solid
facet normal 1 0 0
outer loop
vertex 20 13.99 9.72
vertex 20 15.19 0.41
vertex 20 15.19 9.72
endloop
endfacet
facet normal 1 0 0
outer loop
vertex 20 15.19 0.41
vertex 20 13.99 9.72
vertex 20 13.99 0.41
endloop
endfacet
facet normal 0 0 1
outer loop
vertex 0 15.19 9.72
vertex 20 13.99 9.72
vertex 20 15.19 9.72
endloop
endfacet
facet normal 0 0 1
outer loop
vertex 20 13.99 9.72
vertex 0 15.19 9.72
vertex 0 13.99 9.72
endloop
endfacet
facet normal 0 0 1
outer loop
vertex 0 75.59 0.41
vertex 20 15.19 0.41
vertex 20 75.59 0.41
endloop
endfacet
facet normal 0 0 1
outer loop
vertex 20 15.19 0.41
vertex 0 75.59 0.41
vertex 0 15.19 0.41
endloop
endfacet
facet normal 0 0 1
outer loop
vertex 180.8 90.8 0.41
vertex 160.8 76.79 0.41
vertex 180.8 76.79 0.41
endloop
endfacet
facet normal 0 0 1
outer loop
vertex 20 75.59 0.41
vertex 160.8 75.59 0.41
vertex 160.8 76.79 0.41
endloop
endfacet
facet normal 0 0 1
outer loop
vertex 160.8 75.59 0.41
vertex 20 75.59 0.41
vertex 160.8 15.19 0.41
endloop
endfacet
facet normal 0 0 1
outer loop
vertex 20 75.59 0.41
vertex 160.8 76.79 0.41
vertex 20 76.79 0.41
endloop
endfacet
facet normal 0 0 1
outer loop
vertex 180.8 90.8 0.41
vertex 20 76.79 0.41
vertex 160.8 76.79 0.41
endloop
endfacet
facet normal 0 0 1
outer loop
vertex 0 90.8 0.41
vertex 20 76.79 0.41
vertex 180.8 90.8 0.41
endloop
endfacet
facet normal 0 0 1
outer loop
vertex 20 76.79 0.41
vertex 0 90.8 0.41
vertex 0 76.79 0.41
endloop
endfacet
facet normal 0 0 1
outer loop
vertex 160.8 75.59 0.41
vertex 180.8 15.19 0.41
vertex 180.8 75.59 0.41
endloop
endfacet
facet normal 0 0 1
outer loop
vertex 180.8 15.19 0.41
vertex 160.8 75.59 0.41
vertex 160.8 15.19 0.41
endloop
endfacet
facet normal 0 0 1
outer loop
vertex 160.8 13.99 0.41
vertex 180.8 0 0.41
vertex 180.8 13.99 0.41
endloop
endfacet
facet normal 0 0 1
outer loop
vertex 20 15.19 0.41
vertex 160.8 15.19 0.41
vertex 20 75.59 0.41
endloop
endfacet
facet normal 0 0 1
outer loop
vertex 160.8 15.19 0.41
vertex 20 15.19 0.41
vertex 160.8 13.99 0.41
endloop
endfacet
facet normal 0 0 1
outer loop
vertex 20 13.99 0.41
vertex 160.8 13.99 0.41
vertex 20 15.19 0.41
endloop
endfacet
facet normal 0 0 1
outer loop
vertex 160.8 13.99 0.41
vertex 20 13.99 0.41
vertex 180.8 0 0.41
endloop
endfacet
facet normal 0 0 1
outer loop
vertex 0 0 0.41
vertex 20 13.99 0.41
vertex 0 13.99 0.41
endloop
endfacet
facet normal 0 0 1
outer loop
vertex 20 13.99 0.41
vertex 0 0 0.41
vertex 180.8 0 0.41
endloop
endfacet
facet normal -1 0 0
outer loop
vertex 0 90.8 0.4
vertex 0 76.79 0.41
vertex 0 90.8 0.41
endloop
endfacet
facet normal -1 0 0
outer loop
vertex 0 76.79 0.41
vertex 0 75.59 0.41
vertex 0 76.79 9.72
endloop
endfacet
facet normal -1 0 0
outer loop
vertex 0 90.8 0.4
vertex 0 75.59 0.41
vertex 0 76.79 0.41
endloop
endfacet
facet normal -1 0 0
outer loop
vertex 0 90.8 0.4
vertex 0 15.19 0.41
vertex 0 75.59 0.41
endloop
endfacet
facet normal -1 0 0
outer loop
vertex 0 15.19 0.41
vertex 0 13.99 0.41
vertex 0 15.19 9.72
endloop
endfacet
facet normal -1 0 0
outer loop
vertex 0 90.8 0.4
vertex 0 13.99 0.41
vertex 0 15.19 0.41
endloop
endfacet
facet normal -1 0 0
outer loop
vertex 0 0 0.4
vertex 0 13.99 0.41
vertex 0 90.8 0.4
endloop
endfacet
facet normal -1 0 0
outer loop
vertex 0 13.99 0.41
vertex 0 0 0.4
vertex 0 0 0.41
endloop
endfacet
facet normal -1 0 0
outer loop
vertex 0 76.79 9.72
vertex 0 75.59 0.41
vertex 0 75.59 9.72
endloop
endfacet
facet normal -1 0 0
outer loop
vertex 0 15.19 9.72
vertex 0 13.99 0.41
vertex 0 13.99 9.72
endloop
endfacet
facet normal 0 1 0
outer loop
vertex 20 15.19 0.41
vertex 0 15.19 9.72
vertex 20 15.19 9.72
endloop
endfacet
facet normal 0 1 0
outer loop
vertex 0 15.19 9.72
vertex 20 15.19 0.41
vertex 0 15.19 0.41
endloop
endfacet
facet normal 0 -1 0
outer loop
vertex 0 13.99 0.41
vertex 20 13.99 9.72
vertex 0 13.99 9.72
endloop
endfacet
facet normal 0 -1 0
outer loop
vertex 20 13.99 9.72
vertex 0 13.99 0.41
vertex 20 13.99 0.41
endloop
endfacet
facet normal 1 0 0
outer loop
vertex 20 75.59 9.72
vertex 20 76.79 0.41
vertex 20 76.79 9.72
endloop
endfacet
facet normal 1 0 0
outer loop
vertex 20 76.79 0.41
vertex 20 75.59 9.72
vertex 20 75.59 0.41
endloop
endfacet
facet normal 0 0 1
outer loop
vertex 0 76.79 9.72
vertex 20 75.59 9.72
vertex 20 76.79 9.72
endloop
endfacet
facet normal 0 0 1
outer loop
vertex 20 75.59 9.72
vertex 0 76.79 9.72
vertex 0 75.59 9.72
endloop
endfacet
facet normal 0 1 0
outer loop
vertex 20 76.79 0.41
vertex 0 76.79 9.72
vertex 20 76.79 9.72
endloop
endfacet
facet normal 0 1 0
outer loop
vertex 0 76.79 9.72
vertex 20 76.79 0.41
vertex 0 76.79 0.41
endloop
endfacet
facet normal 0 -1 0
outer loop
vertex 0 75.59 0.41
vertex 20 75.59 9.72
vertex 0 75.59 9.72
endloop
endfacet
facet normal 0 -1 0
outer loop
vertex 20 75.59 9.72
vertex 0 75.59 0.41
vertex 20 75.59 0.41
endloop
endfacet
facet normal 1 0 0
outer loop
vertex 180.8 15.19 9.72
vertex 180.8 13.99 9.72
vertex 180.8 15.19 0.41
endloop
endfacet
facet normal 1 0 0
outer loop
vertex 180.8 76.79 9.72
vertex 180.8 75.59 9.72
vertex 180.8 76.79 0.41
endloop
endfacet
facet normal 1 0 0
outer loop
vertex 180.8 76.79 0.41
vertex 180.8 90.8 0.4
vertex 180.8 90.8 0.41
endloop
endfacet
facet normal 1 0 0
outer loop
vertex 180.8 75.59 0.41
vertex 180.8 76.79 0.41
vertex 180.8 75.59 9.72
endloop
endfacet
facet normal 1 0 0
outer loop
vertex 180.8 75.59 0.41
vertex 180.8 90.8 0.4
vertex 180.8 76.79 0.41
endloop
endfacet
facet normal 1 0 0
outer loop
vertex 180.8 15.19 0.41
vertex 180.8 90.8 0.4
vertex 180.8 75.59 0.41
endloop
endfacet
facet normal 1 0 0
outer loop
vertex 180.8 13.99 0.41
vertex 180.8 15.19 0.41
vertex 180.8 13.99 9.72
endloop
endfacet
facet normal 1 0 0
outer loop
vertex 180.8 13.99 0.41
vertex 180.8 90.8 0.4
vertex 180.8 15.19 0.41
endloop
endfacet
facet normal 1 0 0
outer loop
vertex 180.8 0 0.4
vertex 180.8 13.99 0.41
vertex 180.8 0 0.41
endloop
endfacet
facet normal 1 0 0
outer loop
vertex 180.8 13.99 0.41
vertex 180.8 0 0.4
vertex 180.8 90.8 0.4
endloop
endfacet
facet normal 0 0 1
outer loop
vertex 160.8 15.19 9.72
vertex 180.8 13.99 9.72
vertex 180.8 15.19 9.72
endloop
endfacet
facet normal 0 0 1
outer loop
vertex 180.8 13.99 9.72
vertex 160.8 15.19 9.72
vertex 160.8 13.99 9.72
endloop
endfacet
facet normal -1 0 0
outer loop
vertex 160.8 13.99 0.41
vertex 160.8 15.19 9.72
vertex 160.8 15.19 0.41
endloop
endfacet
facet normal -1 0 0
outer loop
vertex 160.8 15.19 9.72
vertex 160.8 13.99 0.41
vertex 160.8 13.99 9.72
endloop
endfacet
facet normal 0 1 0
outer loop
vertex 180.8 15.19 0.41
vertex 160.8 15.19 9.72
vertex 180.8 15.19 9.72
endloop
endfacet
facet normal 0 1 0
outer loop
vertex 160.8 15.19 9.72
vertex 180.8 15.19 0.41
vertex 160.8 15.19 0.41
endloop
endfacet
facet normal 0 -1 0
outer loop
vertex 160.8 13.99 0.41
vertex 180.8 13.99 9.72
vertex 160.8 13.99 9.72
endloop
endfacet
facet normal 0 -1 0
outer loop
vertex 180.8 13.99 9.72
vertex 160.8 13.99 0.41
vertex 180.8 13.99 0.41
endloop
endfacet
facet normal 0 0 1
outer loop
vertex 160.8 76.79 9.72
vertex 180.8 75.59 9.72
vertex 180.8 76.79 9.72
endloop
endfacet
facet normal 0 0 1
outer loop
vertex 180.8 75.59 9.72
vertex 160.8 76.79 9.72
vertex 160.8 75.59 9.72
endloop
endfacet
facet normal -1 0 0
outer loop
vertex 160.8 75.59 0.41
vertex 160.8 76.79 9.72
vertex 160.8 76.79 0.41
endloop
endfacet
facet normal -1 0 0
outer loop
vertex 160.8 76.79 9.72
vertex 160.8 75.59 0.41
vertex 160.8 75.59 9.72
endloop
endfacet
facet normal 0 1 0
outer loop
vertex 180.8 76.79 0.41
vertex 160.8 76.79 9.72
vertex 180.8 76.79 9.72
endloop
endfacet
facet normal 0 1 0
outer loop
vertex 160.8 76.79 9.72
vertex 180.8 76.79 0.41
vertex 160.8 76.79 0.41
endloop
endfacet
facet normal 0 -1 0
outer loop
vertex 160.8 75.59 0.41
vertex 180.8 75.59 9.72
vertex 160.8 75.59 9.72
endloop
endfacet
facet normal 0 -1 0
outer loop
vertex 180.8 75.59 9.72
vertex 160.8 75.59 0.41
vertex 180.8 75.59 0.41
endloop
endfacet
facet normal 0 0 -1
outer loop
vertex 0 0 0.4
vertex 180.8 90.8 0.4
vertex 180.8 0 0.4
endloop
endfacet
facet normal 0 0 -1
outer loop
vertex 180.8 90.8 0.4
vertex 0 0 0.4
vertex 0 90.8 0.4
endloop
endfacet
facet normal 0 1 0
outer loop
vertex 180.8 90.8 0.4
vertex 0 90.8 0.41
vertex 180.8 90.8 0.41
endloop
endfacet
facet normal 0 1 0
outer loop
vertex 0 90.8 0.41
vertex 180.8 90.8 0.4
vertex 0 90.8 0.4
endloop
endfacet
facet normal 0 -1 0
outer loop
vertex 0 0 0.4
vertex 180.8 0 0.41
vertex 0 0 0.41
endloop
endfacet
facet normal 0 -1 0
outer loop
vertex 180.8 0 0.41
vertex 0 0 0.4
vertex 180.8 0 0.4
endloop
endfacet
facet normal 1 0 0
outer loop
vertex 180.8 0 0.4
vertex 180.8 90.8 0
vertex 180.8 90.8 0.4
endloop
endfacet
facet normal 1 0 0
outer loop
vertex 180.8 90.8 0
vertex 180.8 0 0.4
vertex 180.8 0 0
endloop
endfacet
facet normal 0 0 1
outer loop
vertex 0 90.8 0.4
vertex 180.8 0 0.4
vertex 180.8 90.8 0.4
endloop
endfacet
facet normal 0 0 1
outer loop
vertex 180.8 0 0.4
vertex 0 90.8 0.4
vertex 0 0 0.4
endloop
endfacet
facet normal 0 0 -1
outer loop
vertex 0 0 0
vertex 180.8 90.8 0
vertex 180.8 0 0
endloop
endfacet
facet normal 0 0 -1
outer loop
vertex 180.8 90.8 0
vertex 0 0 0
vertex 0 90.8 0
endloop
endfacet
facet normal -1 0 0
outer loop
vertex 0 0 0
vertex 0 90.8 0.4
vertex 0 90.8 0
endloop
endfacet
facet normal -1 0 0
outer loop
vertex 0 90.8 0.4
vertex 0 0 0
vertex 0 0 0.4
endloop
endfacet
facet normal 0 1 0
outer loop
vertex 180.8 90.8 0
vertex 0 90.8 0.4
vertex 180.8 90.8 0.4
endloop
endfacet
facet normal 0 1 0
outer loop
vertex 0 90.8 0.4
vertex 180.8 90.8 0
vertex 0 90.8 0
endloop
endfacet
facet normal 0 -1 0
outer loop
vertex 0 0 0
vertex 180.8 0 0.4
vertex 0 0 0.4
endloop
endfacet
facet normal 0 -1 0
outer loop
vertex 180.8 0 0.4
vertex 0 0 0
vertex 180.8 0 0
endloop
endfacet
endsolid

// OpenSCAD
// file: ../../Base/Rotation.scad
// Fischertechnik Box Foundation
// Geometry Helpers Rotation

include <PlacementOptions.scad>

// getRotatedSpace(space, rotation=NoRotation)
// Rotates the space dependent on the specified rotation

function getRotatedSpace(space, rotation=NoRotation) = [
    (rotation == Rotate90 || rotation == Rotate270) ? space.y : space.x,
    (rotation == Rotate90 || rotation == Rotate270) ? space.x : space.y
];

// Rotates the given space around the fixed left lower corner
// space = the space the children needs as width/depth list [width,depth]
// rotation = 0 Rotate0 degrees, 1 Rotate90 degrees, 2 Rotate180 degrees, 3 Rotate270 degrees (equivalent to -90)

module RotateFix(space, rotation=NoRotation) {
    dy = (rotation == Rotate0 || rotation == Rotate270) ? 0 :
        (rotation == Rotate90) ? space.x :
        space.y;
    dx = (rotation < Rotate180) ? 0 :
        (rotation == Rotate180) ? space.x :
        space.y;
    
    translate([dx, dy, 0])
        rotate([0, 0, rotations[rotation]])
            children();
}
// file: ../../Base/Alignment.scad
// Fischertechnik Box Foundation
// Geometry Helpers Alignment

include <PlacementOptions.scad>

// getAlignedX(elementWidth, spaceWidth, align=AlignRight, offset=0)
// Gets the aligned X offset of an element with the given
// width in the given space.
// elementWidth = The width of the element to positon
// spaceWidth = The space where the element should be aligned
// align = 0 AlignLeft, 1 AlignCenter, 2 AlignRight
// offset = an optional offset from the aligned position. When
// aligned left or centered, then positive values are in X direction.
// When aligned right then positive values are in negative X direction.

function getAlignedX(elementWidth, spaceWidth, align=AlignRight, offset=0) =
    (align == AlignLeft) ?
        offset :
        ((align == AlignCenter) ?
        (spaceWidth - elementWidth)/2 + offset :
        spaceWidth - offset - elementWidth);

// getAlignedY(elementDepth, spaceDepth, align=AlignTop, offset=0)
// Gets the aligned Y offset of an element with the given
// depth in the given space.
// elementDepth = The depth of the element to positon
// spaceDepth = The space where the element should be aligned
// align = 0 AlignBottom, 1 AlignCenter, 2 AlignTop
// offset = an optional offset from the aligned position. When
// aligned bottom or centered, then positive values are in Y direction.
// When aligned top then positive values are in negative Y direction.

function getAlignedY(elementDepth, spaceDepth, align=AlignTop, offset=0) =
    (align == AlignBottom) ?
        offset :
        ((align == AlignCenter) ?
        (spaceDepth - elementDepth)/2 + offset :
        spaceDepth - offset - elementDepth);
// file: ../../Base/Boxes.scad
// Fischertechnik Box Foundation
// Pre-designed Boxes

use <Constants.scad>

include <PlacementOptions.scad>

box190Width = 190;
box190Depth = 130;
box130Width = 130;
box130Depth = 95;

// Values are from an original ec3 box
topBottomDifference = 1.5;
outerHeight = 40;
innerHeight = 38.2;
baseThickness = outerHeight - innerHeight;
stackExcess = 5.7;
radius = 3.5;
wallThickness = 1.5;
tolerance = 0.2;
stackOffset = innerHeight - stackExcess;

boxUsageHeight = stackOffset;
boxWallThickness = wallThickness;
boxBaseThickness = baseThickness;
boxWebWidth = 3.0;

// getBoxWallThickness()
// Gets the wall thickness of a Fischertechnik Box
function getBoxWallThickness() = boxWallThickness;

// getBoxUsageHeight()
// Gets the usable height of a Fischertechnik box
function getBoxUsageHeight() = boxUsageHeight;

// getBoxInnerHeight()
// Gets the inner height of a Fischertechnik box, including the stack excess
function getBoxInnerHeight() = innerHeight;

// getBoxBaseThickness()
// Gets the thickness of the Fischertechnik box base.
function getBoxBaseThickness() = boxBaseThickness;

// getBoxWebWidth()
// Gets the width of a box web
function getBoxWebWidth() = boxWebWidth;

// getBox190Space()
// Gets the usable inner space of a Box 190 as an x/y-list
function getBox190Space() = [
    box190Width - 2*getBoxWallThickness() - topBottomDifference, 
    box190Depth - 2*getBoxWallThickness() - topBottomDifference ];

// BoxBase(width, depth)
// Creates an empty stackable Fischertechnik compatible box
// width = Outer width of the box (190, 130, ...)
// depth = Outer depth of the box (130, 95, ...)

module BoxBase(width, depth, height=outerHeight) {    
    thinPlate = 0.01;

    innerHeight = height - baseThickness;    
    
    module BodyPlate(width, depth) {
        translate([radius, radius])
        hull() {
            w = width-2*radius;
            d = depth-2*radius;
            cube([w, d, thinPlate]);
            cylinder(thinPlate, r=radius, $fn=getFragments());
            translate([w, 0])
                cylinder(thinPlate, r=radius, $fn=getFragments());
            translate([w, d])
                cylinder(thinPlate, r=radius, $fn=getFragments());
            translate([0, d])
                cylinder(thinPlate, r=radius, $fn=getFragments());
        }
    }
    
    module Body(tolerance=tolerance) {
        hull() {
            // Bottom with tolerance to fit into the original boxes when stacked
            translate([-wallThickness+tolerance, -wallThickness+tolerance, -baseThickness])
                BodyPlate(width-topBottomDifference-2*tolerance, depth-topBottomDifference-2*tolerance);
            
            // Top
            translate([-wallThickness-topBottomDifference/2, -wallThickness-topBottomDifference/2, innerHeight-thinPlate])
                BodyPlate(width, depth);
         }
    }

    module Cutoff() {
        hull() {
            coWidth = width - 2*wallThickness;
            coDepth = depth - 2*wallThickness;
            
            // Bottom
            BodyPlate(coWidth-topBottomDifference, coDepth-topBottomDifference);

            // Top
            translate([-topBottomDifference/2, -topBottomDifference/2, innerHeight+thinPlate]) 
                BodyPlate(coWidth, coDepth);
        }
    }
    
    difference() {        
        Body();
        Cutoff();
        stackOffset = innerHeight - stackExcess;
        translate([0, 0, stackOffset + baseThickness])
            Body(tolerance=0);
    }
}

// Creates the Fischertechnik empty box 130x190 mm and places it at position 0,0
// 190x130 are the outer sizes, the inner space is slightly smaller. Use getBox190Space() to get the inner sizes.
// The box is positioned that the usable inner space is at the 0,0,0 position. The

module Box190() {
    BoxBase(box190Width, box190Depth);
}

// Gets the usable inner space of a Box 130 as an x/y-list
function getBox130Space() = [
    box130Width - 2*getBoxWallThickness() - topBottomDifference, 
    box130Depth - 2*getBoxWallThickness() - topBottomDifference ];

// Creates the Fischertechnik empty box 95x130 mm and places it at position 0,0
// 190x130 are the outer sizes, the inner space is slightly smaller. Use getBox190Space() to get the inner sizes.
// The box is positioned that the usable inner space is at the 0,0,0 position. The

module Box130() {
    BoxBase(box130Width, box130Depth);
}

// Creates a web at the specified box walls
// corner 0 = LowerLeft, 1 = UpperLeft, 2 = UpperRight, 3 = LowerRight
// side 0 = LeftOfCorner, 1 = RightOfCorner
// distance = Distance in mm from the corner
// boxSpace = inner width and depth of the box (default: Box 190)
// webWidth = length of the web (default is 3 mms)
// webThickness = thickness of the web (default is 1 mm)

module BoxWeb(corner, side, distance, boxSpace=getBox190Space(), webWidth=getBoxWebWidth(), webThickness=1.0) {
    sink = getBoxWallThickness()/2;

    width = (corner % 2 == 0) ? 
            (side == LeftOfCorner ? webWidth : webThickness) :
            (side == LeftOfCorner ? webThickness : webWidth);

    depth = (corner % 2 == 0) ? 
            (side == RightOfCorner ? webWidth : webThickness) :
            (side == RightOfCorner ? webThickness : webWidth);
    
    xDiff = corner == LowerLeft ? 
                (side == LeftOfCorner ? -sink : distance) :
            (corner == UpperLeft ?                
                (side == LeftOfCorner ? distance : -sink) :
            (corner == UpperRight ?
                (side == LeftOfCorner ? boxSpace.x-webWidth+sink : boxSpace.x-distance-webThickness) :
                (side == LeftOfCorner ? boxSpace.x-distance-webThickness: boxSpace.x-webWidth+sink)));

    yDiff = corner == LowerLeft ? 
                (side == RightOfCorner ? -sink : distance) :
            (corner == UpperLeft ?
                (side == RightOfCorner ? boxSpace.y-distance : boxSpace.y-webWidth+sink) :
            (corner == UpperRight ?
                (side == RightOfCorner ? boxSpace.y-webWidth+sink : boxSpace.y-distance) :
                (side == RightOfCorner ? distance : -sink)));
    
    translate([xDiff, yDiff, -getExcess()])
        cube([width, depth, boxUsageHeight + 2*getExcess()]);
}
// file: ../../Base/PlacementOptions.scad
// Fischertechnik Box Foundation
// Placement Options

// Alignment
NoAlign = 0;
AlignLeft = 1;
AlignBottom = 2;
AlignCenter = 3;
AlignRight = 4;
AlignTop = 5;

// Element rotation degree steps
rotations = [0, -90, -180, -270];

// Rotation
NoRotation = 0;
Rotate0 = 0;
Rotate90 = 1;
Rotate180 = 2;
Rotate270 = 3;

// Docking (seen from above)
NoDock = -1;
DockLeft = 0;
DockTop = 1;
DockRight = 2;
DockCorner = 2;
DockBottom = 3;

// Web corners
LowerLeft = 0;
UpperLeft = 1;
UpperRight = 2;
LowerRight = 3;

// Web position relative to corner
LeftOfCorner = 0;
RightOfCorner = 1;
// file: ../../Base/Placement.scad
// Fischertechnik Box Foundation
// Geometry Helpers Placement

use <Constants.scad>
use <Alignment.scad>
use <Rotation.scad>
use <Boxes.scad>

include <PlacementOptions.scad>

// Place(x=0, y=0, elementSpace=[0,0], alignX=AlignLeft, alignY=AlignBottom, rotation=Rotate0, boxSpace=getBox190Space())
// Places the child at the specified position
// y = Y-Position. This is a relative position when an X aligment is specified.
// x = X-Position. This is a relative position when an Y aligment is specified.
// elementSpace = space of the element to be placed [x,y]
// alignX = -1=NoAlign, 0 AlignLeft, 1 AlignCenter, 3 AlignRight (elementSpace and boxSpace required!)
// alignY = -1=NoAlign, 2 AlignBottom, 1 AlignCenter, 4 AlignTop (elementSpace and boxSpace required!)
// rotation = 0 Rotate0 0 degrees, 1 Rotate90 90 degrees, 
// 2 Rotate180 180 degrees, 3 Rotate270 270 degrees (equivalent to -90)
// boxSpace = Inner space of the box where the placement occurs [x,y] - default is Box 190x130 inner space

module Place(x=0, y=0, elementSpace=[0,0], 
  alignX=AlignLeft, alignY=AlignBottom, 
  rotation=NoRotation, boxSpace=getBox190Space()) {

    module Position(x, y, space, rotation=Rotate0) {
        translate([x, y, 0])
            RotateFix(space, rotation)
                children();
    }

    space = getRotatedSpace(elementSpace, rotation);
    alignedX = getAlignedX(space.x, boxSpace.x, alignX, x);
    alignedY = getAlignedY(space.y, boxSpace.y, alignY, y);
    Position(alignedX, alignedY, elementSpace, rotation)
        children();
}

// Center(space=getBox130Space(), elementSpace=[0,0])
// space = Space where the children is centered. For cylinder use centered=true and no elementSpace.
// elementSpace = space of the element to be centered [x,y]

module Center(space=getBox190Space(), elementSpace=[0,0]) {
    Place(elementSpace=elementSpace, boxSpace=space, alignX=AlignCenter, alignY=AlignCenter)
        children();
}

// CenterHorizontal(width=0, y=0, offset=0, space=getBox130Space())
// width = Width of the element to be placed.
// y = Y position of the element
// offset = Offset from the center position (negative will be left of the center)
// space = Space where the element is placed

module CenterHorizontal(width=0, y=0, offset=0, space=getBox190Space()) {
    Place(x=offset, y=y, elementSpace=[width, 0], boxSpace=space, alignX=AlignCenter)
        children(0);
}

// CenterVertical(depth=0, x=0, offset=0, space=getBox130Space())
// depth = Depth of the element to be placed.
// x = X position of the element
// offset = Offset from the center position (negative will be down of the center)
// space = Space where the element is placed

module CenterVertical(depth=0, x=0, offset=0, space=getBox190Space()) {
    Place(x=x, y=offset, elementSpace=[0, depth], boxSpace=space, alignY=AlignCenter)
        children(0);
}

// getIsVertical(align)
// True if the specified alignment needs a vertical orientation for a divider (AlignRight, AlignLeft)

function getIsVertical(align) = (align == AlignRight || align == AlignLeft);

// getIsHorizontal(align)
// True if the specified alignment needs a horizontal orientation for a divider (AlignTop, AlignBottom)

function getIsHorizontal(align) = (align == AlignTop || align == AlignBottom);
// file: ../../Elements/AxisClip10.scad
// Fischertechnik Box Library
// Axis for clip 10
// 31023

use <../ModelBase/Simple.scad>
use <../Base/Constants.scad>

width = 12;
depth = 12;
height = 23;
upperDiameter = 3.6;
clipHeight = 10;

// getAxisClip10Space()
// Gets the space of a frame for a clip 10 with spring ring (mot2)

function getAxisClip10Space() = [width, depth, height];

// AxisClip10(height, clipHeight)
// Axis for clip 10 with spring ring (mot2)
// height = Height of the complete axis
// clipHeight = Height of the rt for the clip (standard is 10, in mot3 its only 7)

module AxisClip10(height=height, clipHeight=clipHeight) {
    LeveledAxisWithSpace(height, height-clipHeight, getAxisClip10Space(), diameter=upperDiameter);
}

// Tests
color("lightgray")
AxisClip10();
// file: ../../Base/Constants.scad
// Fischertechnik Box Foundation
// Constants

// Constant values necessary for multiple elements

// Base constants
dividerThickness = 1.2;
excess = 0.01;
fragments = 90;
tolerance = 0.8;

// Gets the thickness of a divider 
function getDividerThickness() = dividerThickness;

// Gets the excess that is used to merge walls into each other
function getExcess() = excess;

// Gets amount of fragments of a cylinder
function getFragments() = fragments;

// Gets the inner tolerance of a frame to each side
function getTolerance() = tolerance;


// Fischertechnik specific constants
axisDiameter = 4;
axisBottomDiameter = axisDiameter + 1;
standardEdgeDistance = 2.5;
standardWebDistance = 11.5;
standardCornerLength = 15;
tubeWallFactor = 0.8;
smallPartsFrameHeight = 20;

// Gets axis diameter
function getAxisDiameter() = axisDiameter;

// Gets axis bottom diameter for thicker part at the bottom
function getAxisBottomDiameter() = axisBottomDiameter;

// gets the standard distance to the wall of the box for dockable frames with webs
function getStandardEdgeDistance() = standardEdgeDistance;

// gets the standard distance of each web to the corner of the dockable frame
function getStandardWebDistance() = standardWebDistance;

// gets the standard length of the corner walls of a dockable frame
function getStandardCornerLength() = standardCornerLength;

// gets the wall thickness of a tube.
function getTubeWallThickness() = tubeWallFactor * getDividerThickness();

// gets the frame height for docked small parts boxes.
function getSmallPartsFrameHeight() = smallPartsFrameHeight;
// file: ../../Elements/RailsBasePlate180x90.scad
// Fischertechnik Box Library
// Base Plate 180 x 90
// 31001

use <../ModelBase/Complex.scad>

width = 180;
depth = 90;

// getRailsBasePlate180x90Space()
// Gets the width and depth of the space the rails base for the base plate 180x90 needs.
function getRailsBasePlate180x90Space() = getRailsBasePlateVolume(width, depth);

// RailsBasePlate180x90()
// Rails for a base plate of 180 x 90 mm
// 31001

module RailsBasePlate180x90() {
    RailsBasePlate(width, depth);
}

// Test
color("lightgray")
RailsBasePlate180x90();
// file: ../TestPrint.scad
// 3D Print Test Base

use <../Base/Constants.scad>

use <../Elements/AxisClip10.scad>

module TestPrint(elementSpace) {
    cube([elementSpace.x, elementSpace.y, 0.4]);
    translate([0,0,0.4+getExcess()]) {
        children();
    }
}

TestPrint(getAxisClip10Space())
    AxisClip10();
// main file
// 3D Print Test
// RailsBasePlate180x90

use <../TestPrint.scad>
use <../../Elements/RailsBasePlate180x90.scad>

TestPrint(getRailsBasePlate180x90Space())
    RailsBasePlate180x90();
